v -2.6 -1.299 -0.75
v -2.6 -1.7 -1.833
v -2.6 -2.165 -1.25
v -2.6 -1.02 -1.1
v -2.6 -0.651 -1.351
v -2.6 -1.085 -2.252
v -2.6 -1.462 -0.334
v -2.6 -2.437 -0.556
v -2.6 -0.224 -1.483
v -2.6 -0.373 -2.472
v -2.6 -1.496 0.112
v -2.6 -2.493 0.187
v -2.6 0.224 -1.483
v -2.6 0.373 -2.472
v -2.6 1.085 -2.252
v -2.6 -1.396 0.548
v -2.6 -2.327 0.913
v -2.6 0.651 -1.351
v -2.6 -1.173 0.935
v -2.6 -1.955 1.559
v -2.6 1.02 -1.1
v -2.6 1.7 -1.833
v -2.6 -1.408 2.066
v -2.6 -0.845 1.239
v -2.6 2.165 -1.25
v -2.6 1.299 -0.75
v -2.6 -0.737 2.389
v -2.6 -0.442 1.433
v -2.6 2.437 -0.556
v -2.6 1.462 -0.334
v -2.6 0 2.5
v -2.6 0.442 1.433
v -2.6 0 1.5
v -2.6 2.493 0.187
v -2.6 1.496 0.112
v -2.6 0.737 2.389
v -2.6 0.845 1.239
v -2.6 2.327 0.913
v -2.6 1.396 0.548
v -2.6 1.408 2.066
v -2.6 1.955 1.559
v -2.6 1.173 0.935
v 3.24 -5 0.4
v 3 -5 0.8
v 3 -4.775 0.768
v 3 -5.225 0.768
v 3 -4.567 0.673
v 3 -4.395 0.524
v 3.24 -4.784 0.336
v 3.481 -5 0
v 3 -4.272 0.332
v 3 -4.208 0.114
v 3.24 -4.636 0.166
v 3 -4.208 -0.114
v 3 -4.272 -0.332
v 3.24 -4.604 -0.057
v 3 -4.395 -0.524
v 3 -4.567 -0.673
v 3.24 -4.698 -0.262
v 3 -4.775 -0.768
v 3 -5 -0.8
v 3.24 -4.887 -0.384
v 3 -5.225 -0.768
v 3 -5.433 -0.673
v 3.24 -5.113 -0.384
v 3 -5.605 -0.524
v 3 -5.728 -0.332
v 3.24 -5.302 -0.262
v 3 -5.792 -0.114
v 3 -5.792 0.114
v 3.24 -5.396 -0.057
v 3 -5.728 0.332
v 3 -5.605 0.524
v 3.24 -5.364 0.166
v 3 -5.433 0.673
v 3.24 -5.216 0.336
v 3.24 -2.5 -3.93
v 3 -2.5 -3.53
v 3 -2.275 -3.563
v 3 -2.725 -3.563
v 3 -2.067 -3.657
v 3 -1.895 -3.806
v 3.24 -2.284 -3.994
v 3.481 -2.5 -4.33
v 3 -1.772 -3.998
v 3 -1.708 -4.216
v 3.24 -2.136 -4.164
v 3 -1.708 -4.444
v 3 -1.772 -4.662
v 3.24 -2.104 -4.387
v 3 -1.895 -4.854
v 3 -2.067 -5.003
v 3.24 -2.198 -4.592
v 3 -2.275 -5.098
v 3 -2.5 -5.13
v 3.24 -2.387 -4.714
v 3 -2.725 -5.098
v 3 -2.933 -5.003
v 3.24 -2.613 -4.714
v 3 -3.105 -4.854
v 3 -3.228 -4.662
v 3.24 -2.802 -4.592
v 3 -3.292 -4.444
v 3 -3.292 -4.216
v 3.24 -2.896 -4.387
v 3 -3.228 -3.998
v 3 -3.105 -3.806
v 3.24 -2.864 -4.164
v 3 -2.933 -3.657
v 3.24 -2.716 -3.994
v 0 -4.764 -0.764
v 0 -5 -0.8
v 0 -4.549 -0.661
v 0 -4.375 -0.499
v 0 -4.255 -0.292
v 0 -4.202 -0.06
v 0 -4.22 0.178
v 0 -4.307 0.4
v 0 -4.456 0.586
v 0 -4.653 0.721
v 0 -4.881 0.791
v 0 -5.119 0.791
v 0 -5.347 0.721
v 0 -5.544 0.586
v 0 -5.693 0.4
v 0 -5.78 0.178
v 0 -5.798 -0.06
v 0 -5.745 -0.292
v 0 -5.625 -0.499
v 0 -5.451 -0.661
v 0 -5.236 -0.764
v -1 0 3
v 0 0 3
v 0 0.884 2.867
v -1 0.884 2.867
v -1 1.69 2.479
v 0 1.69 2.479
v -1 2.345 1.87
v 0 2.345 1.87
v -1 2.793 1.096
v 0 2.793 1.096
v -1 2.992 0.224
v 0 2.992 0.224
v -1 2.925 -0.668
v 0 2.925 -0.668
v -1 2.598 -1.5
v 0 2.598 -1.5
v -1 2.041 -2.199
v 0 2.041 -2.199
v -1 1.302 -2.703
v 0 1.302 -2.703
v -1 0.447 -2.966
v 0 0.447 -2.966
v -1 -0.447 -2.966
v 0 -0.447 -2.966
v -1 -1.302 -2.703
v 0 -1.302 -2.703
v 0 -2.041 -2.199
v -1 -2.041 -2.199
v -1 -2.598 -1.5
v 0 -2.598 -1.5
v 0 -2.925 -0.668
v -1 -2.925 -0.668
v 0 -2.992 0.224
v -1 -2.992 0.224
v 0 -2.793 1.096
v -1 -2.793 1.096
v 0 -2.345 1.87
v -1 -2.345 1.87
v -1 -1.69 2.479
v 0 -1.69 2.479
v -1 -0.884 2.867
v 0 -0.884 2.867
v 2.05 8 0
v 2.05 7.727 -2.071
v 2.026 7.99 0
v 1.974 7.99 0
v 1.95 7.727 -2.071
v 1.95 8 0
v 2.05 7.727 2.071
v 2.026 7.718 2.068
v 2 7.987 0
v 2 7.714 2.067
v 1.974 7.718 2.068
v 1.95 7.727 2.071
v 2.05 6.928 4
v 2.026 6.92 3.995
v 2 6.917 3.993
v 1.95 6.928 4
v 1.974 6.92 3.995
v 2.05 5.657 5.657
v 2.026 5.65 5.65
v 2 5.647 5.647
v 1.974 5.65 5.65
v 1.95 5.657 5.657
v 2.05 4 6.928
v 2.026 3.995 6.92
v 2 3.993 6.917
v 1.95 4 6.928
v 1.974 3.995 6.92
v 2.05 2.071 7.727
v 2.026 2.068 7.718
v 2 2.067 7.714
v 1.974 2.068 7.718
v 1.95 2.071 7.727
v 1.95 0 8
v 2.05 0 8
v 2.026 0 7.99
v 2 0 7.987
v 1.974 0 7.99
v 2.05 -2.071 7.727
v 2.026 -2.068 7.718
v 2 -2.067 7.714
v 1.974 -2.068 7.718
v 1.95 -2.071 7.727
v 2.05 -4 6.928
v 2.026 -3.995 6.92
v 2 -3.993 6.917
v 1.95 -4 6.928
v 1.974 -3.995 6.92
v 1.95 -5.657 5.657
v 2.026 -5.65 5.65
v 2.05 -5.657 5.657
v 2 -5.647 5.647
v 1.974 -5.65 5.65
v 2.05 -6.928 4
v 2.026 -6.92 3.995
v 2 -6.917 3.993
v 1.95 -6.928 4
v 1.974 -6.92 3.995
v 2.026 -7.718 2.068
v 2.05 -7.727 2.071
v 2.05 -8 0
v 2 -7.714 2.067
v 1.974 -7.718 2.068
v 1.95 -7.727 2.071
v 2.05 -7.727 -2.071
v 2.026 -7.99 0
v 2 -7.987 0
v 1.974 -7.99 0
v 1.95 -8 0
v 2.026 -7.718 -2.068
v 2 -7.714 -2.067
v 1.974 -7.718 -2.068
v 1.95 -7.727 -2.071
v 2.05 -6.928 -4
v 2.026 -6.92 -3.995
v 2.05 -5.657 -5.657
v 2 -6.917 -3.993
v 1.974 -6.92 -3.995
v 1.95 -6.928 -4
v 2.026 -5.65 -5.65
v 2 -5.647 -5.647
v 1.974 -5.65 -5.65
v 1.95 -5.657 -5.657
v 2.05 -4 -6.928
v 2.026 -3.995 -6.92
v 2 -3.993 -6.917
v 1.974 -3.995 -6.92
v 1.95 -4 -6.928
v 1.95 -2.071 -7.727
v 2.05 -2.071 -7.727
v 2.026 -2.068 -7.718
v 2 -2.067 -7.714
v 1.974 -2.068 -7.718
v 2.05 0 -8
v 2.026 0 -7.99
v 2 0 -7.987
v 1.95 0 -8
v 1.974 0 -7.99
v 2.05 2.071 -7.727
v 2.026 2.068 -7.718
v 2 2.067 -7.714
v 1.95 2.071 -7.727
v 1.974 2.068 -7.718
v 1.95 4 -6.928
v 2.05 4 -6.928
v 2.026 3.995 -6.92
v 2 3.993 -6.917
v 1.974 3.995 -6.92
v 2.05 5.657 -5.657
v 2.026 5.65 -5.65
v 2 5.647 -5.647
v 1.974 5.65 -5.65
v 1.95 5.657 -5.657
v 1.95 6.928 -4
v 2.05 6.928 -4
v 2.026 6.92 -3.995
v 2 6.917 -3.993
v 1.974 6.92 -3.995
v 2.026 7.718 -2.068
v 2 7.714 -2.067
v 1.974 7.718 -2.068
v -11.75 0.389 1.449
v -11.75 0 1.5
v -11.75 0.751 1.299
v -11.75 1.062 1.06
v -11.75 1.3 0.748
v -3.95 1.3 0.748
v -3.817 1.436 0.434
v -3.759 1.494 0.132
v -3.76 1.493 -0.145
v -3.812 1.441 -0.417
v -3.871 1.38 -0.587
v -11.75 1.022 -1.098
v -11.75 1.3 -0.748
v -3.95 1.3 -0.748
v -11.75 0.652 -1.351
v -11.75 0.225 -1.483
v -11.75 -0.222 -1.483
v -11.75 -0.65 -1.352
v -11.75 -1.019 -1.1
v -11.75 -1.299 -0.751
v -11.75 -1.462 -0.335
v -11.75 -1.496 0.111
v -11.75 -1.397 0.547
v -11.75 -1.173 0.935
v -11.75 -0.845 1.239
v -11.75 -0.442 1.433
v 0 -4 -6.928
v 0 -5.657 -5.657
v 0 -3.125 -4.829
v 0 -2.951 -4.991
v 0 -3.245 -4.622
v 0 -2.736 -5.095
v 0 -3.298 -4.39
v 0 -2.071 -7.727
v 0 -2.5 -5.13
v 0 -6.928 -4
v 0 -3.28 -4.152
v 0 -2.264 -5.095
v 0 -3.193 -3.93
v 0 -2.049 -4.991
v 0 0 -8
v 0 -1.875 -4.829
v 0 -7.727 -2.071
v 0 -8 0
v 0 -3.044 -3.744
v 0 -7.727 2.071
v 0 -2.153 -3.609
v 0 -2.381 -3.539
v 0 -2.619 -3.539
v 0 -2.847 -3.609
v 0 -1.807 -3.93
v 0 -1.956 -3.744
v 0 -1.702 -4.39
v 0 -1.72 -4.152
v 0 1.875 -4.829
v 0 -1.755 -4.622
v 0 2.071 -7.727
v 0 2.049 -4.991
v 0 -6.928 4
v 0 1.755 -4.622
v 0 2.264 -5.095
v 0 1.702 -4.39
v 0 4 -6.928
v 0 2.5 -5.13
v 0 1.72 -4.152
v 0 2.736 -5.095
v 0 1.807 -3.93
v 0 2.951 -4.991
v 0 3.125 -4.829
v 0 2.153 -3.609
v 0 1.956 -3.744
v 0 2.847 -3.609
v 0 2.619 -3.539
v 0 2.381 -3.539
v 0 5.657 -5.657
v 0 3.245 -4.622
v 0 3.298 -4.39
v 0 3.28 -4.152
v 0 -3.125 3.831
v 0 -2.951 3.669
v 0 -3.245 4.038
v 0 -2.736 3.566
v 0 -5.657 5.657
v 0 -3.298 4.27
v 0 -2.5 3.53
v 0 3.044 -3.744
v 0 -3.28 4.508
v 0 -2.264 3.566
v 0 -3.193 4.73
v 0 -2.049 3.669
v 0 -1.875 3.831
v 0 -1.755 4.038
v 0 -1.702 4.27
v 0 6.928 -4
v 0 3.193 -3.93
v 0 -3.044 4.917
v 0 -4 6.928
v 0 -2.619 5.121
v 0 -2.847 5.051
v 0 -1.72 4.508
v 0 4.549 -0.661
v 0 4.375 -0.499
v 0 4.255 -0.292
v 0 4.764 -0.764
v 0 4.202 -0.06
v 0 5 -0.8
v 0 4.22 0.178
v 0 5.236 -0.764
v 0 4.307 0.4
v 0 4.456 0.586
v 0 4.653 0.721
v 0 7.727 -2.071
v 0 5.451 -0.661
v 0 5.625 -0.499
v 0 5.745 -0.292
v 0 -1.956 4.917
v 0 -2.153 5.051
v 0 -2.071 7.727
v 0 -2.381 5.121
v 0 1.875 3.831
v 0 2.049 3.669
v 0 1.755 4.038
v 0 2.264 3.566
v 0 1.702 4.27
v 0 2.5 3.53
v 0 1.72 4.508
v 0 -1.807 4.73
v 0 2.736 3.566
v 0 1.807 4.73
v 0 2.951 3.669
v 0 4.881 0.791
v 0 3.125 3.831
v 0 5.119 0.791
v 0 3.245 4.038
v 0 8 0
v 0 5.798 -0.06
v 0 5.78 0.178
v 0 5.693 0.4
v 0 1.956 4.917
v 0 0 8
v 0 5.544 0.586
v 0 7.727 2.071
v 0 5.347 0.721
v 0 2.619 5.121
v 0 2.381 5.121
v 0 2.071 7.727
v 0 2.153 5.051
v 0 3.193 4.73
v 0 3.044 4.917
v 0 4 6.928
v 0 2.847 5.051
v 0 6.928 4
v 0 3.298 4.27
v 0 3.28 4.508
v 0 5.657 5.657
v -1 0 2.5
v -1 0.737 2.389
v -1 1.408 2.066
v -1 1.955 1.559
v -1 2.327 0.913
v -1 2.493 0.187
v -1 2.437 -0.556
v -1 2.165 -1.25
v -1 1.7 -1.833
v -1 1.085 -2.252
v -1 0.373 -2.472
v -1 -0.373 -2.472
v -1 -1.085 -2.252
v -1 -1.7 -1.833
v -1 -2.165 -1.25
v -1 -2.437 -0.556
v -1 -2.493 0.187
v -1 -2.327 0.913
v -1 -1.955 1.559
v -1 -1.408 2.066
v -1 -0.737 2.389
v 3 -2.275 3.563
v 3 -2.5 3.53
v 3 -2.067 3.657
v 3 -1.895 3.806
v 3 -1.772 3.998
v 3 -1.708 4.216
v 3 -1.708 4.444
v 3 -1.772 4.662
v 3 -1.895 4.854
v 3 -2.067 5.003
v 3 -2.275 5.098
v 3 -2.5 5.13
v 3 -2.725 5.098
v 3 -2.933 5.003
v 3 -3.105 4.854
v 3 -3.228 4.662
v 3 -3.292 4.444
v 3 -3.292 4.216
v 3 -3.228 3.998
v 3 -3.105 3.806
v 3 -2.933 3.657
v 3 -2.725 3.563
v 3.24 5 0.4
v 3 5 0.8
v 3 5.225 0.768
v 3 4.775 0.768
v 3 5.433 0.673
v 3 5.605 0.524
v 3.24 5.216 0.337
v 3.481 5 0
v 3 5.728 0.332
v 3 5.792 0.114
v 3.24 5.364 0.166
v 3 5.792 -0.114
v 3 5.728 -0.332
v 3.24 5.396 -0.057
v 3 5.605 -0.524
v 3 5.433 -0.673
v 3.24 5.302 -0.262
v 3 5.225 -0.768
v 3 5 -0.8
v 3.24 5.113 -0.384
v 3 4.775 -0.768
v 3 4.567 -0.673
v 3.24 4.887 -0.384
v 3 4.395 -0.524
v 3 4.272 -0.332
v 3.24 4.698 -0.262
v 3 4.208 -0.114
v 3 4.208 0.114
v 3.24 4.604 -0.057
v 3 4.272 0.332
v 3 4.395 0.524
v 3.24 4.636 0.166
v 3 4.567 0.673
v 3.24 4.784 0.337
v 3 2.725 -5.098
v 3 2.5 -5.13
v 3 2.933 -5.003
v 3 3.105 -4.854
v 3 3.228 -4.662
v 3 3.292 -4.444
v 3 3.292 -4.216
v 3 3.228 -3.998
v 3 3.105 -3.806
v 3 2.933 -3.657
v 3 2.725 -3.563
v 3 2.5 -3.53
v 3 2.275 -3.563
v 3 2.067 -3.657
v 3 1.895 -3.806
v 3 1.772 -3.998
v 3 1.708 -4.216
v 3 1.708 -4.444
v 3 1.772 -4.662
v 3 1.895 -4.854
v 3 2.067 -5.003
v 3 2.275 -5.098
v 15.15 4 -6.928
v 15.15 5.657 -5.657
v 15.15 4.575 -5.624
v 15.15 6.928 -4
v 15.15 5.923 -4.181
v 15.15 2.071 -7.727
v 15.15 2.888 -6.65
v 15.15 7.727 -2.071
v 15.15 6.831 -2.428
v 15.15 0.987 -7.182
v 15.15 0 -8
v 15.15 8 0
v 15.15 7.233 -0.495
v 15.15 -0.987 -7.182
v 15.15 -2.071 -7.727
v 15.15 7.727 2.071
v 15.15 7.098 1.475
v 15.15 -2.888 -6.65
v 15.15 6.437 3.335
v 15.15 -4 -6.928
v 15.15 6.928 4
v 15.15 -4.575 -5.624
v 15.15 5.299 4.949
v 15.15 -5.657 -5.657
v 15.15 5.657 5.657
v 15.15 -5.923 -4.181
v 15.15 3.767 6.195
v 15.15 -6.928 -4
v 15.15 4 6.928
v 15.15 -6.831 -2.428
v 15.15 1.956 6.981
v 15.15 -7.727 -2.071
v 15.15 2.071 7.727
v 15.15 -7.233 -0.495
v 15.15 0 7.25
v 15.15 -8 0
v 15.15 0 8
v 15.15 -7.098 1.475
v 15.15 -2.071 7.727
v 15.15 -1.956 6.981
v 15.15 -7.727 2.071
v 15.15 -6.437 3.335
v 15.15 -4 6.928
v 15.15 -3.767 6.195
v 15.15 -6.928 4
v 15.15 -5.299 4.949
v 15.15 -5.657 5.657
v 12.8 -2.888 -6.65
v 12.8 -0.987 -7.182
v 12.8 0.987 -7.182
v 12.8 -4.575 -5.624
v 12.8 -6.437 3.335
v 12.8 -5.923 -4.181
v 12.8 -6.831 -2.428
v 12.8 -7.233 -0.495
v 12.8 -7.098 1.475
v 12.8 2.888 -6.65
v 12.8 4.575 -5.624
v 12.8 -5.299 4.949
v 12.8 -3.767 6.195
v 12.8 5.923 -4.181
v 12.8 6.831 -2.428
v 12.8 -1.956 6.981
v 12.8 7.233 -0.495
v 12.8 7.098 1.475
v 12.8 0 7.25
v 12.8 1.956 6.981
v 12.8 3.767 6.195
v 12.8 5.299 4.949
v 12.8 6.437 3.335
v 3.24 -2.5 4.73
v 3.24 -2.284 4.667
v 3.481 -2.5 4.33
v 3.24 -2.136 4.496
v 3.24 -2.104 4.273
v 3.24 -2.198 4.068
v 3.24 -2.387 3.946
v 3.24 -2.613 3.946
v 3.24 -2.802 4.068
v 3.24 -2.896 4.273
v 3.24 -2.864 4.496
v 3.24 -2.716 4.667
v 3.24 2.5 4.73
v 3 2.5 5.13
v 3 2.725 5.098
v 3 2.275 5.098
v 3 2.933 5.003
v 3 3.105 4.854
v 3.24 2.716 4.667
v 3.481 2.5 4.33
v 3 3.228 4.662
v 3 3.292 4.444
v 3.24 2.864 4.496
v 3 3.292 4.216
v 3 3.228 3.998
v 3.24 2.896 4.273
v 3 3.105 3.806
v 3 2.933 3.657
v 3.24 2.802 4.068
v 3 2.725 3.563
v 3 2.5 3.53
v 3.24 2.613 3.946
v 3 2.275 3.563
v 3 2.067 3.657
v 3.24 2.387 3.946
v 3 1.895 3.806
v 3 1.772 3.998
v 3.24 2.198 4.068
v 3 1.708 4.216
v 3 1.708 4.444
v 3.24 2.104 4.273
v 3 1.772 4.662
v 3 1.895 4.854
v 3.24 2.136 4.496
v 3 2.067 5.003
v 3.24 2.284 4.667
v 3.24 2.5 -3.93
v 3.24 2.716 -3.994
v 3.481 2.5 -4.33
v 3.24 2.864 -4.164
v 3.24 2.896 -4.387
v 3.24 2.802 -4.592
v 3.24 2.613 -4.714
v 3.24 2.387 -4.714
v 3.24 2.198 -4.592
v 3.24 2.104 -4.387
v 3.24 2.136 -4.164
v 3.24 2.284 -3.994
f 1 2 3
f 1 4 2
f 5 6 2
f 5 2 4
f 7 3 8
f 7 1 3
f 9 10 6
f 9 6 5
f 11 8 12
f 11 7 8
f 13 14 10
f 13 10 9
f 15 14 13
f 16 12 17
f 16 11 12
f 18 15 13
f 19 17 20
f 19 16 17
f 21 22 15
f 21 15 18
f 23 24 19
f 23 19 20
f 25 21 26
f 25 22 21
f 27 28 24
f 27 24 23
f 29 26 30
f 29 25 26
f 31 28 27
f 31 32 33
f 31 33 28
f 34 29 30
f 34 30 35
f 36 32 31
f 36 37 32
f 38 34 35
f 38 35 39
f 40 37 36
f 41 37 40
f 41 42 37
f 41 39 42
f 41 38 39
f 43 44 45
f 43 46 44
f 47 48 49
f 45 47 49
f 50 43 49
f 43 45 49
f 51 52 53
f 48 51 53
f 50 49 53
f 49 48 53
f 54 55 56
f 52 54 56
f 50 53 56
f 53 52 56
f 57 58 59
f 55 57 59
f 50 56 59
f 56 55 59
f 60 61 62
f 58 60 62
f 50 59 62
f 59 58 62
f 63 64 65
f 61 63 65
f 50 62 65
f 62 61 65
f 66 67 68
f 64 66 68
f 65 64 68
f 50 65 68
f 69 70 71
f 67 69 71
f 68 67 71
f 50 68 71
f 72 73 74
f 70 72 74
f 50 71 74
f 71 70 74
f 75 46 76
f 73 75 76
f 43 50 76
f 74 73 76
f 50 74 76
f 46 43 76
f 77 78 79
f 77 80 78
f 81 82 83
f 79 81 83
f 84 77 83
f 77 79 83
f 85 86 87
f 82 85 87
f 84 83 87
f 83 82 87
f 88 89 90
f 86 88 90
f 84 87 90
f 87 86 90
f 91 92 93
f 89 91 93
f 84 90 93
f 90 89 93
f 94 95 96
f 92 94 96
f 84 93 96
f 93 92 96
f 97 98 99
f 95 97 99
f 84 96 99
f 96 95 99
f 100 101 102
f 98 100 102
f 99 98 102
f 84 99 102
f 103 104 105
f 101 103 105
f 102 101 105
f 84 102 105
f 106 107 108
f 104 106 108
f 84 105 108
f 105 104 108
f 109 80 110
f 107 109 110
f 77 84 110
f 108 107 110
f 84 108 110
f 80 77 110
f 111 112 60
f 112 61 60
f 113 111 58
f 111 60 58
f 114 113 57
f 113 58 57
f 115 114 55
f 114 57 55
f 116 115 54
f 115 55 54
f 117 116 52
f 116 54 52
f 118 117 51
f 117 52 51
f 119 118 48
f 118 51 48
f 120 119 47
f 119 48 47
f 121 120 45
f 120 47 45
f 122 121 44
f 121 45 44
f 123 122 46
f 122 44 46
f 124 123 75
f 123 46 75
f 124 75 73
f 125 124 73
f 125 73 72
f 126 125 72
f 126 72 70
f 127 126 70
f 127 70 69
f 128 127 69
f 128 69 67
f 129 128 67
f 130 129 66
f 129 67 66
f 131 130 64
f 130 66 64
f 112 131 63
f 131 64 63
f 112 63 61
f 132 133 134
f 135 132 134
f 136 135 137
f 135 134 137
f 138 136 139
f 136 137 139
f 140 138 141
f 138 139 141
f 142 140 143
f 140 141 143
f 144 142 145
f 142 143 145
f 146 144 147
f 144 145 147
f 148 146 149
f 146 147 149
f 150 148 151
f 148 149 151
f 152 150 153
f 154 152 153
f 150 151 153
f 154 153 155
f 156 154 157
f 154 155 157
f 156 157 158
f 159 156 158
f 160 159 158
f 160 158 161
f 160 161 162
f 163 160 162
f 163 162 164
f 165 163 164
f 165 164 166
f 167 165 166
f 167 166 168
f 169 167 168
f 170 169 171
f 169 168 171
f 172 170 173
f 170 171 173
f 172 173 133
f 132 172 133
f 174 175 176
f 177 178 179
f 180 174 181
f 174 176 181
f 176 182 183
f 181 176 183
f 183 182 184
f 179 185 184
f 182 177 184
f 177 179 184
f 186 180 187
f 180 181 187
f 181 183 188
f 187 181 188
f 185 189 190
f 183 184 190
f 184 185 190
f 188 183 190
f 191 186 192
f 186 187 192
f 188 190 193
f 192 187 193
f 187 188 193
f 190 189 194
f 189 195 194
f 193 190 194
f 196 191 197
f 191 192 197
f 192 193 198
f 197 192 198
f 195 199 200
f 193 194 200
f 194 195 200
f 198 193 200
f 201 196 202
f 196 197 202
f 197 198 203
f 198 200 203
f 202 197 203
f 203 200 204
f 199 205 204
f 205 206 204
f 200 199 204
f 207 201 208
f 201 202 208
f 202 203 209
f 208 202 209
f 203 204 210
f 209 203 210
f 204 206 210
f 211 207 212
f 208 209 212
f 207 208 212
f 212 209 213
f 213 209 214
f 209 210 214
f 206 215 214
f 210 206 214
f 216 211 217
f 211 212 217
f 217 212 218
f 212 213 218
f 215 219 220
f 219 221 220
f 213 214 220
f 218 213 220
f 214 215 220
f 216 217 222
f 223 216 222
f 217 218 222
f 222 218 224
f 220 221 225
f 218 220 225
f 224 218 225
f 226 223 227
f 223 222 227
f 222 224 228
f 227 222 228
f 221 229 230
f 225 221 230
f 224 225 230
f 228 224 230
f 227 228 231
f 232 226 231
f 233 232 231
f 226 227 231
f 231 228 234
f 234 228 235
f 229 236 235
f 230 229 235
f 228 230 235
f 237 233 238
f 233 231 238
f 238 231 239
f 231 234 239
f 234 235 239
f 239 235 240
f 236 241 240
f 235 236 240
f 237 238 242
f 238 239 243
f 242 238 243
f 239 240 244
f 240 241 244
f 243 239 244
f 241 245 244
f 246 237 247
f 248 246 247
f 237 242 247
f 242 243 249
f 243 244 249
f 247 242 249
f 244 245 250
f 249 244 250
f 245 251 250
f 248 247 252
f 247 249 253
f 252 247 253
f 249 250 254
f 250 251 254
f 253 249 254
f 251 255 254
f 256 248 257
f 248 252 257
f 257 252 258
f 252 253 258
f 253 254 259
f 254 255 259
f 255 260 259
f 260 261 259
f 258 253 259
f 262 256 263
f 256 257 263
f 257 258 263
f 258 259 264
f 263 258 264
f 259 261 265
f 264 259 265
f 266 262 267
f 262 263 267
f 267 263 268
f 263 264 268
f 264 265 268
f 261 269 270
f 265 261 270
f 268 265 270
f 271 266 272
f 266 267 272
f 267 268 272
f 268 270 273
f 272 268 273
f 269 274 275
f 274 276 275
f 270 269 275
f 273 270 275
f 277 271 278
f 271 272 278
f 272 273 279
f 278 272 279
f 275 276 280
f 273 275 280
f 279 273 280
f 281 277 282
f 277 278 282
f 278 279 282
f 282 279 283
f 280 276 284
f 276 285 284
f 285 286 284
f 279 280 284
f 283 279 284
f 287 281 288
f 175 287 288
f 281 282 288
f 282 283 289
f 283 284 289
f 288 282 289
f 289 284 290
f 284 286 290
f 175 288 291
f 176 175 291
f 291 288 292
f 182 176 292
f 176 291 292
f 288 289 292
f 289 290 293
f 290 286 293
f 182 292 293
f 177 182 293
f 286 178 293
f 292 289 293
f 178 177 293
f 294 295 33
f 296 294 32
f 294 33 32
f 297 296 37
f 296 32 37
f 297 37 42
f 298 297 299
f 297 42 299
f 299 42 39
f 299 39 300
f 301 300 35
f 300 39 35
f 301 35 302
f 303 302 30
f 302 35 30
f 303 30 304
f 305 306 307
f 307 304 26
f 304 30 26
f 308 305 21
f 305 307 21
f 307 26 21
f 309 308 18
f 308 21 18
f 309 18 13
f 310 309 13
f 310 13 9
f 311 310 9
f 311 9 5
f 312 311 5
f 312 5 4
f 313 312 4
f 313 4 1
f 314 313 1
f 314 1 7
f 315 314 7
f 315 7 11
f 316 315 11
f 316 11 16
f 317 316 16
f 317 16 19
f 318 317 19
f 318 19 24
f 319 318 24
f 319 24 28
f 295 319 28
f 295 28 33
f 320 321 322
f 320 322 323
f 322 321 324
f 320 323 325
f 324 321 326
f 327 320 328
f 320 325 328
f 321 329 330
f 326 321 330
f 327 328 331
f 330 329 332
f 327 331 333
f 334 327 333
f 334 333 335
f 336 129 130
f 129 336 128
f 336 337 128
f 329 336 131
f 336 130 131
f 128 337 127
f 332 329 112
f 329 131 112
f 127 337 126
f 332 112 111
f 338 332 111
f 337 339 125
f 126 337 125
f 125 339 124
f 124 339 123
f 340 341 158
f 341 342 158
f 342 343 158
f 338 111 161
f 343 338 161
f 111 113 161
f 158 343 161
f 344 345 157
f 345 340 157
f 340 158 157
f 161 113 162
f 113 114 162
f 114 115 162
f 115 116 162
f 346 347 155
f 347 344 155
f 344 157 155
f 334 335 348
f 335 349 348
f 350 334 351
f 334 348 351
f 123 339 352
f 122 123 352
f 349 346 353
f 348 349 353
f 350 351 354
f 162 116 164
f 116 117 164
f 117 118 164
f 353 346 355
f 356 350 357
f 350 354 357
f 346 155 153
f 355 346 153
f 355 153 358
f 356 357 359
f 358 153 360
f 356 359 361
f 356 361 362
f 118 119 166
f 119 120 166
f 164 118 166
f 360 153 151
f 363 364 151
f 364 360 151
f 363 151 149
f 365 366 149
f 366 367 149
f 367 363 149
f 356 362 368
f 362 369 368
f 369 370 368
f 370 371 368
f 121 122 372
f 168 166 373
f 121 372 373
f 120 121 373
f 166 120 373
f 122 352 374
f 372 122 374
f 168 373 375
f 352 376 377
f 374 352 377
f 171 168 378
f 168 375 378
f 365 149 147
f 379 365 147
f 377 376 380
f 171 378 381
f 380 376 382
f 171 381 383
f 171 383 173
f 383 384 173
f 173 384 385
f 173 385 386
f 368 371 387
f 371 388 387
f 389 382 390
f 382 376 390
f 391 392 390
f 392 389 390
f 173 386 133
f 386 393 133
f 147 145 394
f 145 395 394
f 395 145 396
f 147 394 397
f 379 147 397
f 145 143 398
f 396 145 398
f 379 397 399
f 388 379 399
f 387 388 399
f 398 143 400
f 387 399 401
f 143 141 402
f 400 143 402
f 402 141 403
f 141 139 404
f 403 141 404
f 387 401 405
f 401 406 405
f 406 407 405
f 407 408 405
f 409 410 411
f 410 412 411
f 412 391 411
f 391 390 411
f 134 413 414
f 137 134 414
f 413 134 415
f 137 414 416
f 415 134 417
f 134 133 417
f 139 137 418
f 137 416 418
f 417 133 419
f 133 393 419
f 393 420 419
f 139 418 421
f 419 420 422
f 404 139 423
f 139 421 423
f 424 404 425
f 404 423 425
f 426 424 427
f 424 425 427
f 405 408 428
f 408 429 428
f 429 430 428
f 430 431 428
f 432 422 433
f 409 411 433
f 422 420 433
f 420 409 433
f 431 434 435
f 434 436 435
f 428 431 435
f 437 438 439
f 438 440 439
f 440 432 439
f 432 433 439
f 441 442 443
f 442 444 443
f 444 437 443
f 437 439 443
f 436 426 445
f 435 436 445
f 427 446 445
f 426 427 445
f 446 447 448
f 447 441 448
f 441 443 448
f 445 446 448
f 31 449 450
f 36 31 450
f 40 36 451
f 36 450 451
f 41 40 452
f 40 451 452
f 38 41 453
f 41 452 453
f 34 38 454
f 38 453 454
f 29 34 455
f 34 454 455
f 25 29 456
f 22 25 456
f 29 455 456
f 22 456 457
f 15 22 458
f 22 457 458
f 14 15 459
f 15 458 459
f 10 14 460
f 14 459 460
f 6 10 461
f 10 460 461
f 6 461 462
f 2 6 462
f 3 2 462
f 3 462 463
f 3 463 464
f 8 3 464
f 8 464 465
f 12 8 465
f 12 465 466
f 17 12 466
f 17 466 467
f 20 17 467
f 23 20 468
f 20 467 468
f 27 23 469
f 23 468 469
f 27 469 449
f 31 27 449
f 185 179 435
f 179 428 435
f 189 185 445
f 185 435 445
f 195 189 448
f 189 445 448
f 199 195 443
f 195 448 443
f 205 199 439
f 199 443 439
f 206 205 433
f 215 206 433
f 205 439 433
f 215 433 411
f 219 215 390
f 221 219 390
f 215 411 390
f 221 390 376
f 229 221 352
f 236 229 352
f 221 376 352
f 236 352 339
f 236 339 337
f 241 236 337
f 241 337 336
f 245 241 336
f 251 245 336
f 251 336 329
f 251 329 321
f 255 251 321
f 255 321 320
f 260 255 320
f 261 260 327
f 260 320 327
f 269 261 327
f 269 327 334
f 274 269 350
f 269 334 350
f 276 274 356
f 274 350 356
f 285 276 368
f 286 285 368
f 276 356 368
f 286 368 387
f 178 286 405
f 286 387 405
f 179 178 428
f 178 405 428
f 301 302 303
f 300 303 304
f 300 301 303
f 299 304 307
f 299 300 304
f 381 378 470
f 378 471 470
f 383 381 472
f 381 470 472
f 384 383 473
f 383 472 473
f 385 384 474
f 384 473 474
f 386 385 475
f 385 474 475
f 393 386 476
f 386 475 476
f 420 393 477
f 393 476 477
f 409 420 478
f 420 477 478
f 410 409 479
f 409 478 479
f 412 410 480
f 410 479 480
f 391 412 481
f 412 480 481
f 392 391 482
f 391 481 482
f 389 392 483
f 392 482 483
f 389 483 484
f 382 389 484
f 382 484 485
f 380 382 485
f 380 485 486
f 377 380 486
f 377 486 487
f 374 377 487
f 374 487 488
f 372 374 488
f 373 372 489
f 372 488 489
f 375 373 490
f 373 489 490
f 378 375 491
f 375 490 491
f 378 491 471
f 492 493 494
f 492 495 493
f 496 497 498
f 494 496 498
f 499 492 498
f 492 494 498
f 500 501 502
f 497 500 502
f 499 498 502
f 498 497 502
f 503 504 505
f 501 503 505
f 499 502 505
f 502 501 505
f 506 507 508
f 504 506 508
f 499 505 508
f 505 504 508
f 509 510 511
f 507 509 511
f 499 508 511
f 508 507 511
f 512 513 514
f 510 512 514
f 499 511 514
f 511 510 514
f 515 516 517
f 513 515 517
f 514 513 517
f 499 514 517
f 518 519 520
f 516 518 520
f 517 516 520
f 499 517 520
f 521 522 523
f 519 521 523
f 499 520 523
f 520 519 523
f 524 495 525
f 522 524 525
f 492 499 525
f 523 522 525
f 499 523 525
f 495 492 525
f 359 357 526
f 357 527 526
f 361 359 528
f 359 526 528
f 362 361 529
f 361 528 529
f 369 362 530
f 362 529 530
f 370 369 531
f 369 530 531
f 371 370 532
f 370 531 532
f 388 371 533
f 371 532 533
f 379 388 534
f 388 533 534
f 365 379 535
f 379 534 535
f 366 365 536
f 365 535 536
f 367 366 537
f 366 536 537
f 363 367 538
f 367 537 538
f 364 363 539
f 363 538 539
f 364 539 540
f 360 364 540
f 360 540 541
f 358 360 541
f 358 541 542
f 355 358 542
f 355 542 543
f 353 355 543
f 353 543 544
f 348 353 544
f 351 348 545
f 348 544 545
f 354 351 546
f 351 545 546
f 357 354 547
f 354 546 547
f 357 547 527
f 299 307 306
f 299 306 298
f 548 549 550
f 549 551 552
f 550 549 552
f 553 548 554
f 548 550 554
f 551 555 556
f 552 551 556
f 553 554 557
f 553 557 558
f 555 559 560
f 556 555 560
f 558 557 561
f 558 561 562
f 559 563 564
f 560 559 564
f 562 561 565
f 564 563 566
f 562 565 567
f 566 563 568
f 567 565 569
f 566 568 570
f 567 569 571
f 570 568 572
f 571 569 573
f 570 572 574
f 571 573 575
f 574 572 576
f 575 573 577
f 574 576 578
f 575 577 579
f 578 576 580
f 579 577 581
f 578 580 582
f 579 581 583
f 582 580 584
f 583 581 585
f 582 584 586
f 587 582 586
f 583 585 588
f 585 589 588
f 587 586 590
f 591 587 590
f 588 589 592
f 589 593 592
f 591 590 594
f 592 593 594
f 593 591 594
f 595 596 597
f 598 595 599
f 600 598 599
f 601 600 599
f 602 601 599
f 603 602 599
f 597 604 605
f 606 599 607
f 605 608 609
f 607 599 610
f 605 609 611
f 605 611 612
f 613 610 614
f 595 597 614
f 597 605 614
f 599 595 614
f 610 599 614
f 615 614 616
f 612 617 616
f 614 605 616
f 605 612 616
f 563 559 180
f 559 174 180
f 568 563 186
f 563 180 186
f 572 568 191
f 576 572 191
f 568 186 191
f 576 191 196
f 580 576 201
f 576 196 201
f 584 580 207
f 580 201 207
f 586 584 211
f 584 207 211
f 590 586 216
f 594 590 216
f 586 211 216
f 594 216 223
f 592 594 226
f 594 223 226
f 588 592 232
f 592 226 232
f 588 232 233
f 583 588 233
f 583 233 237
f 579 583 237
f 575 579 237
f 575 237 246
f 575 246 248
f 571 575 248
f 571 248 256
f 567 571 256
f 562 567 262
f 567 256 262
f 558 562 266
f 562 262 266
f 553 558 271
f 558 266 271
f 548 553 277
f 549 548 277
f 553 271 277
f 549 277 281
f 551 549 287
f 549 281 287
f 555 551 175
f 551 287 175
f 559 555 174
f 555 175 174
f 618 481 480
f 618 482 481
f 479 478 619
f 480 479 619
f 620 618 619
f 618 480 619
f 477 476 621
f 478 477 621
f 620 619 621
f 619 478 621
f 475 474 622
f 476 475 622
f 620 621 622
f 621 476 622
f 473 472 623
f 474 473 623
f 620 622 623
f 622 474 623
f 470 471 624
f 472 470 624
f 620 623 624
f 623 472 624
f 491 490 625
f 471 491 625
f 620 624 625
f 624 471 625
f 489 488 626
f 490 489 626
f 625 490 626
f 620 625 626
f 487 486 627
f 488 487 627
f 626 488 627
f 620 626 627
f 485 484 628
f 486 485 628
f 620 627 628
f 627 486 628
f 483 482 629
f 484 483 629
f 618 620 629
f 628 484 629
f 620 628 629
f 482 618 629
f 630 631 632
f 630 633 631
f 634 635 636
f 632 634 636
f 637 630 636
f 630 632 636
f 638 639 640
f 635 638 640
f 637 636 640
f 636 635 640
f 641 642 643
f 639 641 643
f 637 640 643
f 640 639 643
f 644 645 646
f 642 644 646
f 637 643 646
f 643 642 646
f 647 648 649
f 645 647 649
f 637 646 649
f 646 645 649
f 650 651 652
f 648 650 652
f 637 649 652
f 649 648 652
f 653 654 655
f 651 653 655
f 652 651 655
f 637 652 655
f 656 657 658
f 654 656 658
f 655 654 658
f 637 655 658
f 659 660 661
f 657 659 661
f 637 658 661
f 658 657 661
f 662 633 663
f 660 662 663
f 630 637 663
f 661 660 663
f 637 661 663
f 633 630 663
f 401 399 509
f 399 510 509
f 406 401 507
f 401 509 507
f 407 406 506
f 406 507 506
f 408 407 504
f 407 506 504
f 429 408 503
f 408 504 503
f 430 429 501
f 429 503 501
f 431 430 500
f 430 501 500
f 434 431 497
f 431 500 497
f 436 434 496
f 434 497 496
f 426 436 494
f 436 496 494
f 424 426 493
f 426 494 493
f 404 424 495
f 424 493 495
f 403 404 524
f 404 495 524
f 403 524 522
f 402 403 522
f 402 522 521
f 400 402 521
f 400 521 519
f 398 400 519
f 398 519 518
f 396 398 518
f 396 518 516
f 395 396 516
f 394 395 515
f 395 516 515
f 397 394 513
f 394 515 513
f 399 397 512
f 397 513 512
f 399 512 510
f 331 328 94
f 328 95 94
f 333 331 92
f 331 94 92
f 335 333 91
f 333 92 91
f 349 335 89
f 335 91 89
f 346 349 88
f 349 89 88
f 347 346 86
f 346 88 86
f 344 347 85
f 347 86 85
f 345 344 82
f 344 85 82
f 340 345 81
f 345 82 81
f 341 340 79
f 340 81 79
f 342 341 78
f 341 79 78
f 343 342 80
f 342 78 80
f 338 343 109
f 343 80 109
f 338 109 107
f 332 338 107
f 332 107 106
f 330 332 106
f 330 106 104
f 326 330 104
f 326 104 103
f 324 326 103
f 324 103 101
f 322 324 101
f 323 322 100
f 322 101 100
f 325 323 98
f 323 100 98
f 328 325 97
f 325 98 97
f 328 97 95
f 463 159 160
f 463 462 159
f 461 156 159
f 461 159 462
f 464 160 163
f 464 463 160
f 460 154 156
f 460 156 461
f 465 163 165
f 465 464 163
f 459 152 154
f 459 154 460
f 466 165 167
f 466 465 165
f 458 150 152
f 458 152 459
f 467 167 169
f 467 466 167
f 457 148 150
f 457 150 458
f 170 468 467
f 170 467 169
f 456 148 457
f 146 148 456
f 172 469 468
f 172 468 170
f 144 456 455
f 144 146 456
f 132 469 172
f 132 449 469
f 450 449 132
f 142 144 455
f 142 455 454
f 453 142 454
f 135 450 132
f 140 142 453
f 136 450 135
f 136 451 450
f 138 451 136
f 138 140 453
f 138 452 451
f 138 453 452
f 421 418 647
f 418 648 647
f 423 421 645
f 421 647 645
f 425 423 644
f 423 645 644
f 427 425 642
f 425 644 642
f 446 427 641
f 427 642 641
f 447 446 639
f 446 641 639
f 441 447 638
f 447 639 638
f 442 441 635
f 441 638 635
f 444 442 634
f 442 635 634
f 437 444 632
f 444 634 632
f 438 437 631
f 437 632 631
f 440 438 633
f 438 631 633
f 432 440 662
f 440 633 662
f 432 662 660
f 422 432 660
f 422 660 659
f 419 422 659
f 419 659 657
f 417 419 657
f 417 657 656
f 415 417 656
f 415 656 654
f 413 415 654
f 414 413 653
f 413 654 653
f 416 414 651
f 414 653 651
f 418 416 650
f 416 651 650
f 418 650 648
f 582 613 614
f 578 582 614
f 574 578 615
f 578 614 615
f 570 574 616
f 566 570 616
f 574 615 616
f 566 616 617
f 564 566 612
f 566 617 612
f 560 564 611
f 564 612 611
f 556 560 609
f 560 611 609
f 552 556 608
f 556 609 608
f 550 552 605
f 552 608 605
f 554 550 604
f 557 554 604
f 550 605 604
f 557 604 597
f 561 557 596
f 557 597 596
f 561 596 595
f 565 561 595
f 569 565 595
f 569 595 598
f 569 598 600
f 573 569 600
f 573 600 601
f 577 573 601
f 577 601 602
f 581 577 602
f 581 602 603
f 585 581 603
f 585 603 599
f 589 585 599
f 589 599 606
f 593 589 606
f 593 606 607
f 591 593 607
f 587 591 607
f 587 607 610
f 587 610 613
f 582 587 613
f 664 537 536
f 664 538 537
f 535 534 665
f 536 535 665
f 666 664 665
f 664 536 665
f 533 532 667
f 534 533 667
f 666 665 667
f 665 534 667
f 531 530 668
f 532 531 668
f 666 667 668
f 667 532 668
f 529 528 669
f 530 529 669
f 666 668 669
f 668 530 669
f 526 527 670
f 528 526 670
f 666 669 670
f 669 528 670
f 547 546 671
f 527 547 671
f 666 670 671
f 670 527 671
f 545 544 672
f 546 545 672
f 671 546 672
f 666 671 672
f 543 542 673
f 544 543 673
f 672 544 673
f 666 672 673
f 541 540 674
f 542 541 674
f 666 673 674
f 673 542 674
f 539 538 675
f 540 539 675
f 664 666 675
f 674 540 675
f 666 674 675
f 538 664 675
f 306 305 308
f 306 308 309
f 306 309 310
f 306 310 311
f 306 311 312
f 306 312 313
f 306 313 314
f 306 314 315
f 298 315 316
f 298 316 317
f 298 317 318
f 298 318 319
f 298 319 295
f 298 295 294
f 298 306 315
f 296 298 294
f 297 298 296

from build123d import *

# Parameters (mm, degrees)
SKETCH2_R                        = 3
BOSS_EXTRUDE1_DEPTH              = 1
SKETCH3_R                        = 2.5
BOSS_EXTRUDE2_DEPTH              = 1.6
SKETCH4_R                        = 1.5
BOSS_EXTRUDE3_DEPTH              = 9.15
CUT_EXTRUDE1_DEPTH               = 7.8
DRAFT1_ANGLE                     = 44.5
F_14_5_14_5_DIAMETER_HOLE1_D     = 14.5
F_14_5_14_5_DIAMETER_HOLE1_DEPTH = 2.35
F_1_6_1_6_DIAMETER_HOLE1_D       = 1.6
F_1_6_1_6_DIAMETER_HOLE1_DEPTH   = 3
F_1_6_1_6_DIAMETER_HOLE1_TIP     = 0.480688495


with BuildPart() as part:
    # Sketch1 → Revolve1 (revolve)
    with BuildSketch(Plane.XY):
        with BuildLine():
            Line((0, 8), (0, 0))
            Line((0, 0), (15.15, 0))
            Line((15.15, 0), (15.15, 8))
            Line((15.15, 8), (2.05, 8))
            ThreePointArc((2.05, 8), (2, 7.98660254), (1.95, 8))
            Line((1.95, 8), (0, 8))
        make_face()
    revolve(axis=Axis((0, 0, 0), (1, 0, 0)))

    # Sketch2 → Boss-Extrude1 (add)
    with BuildSketch(Plane.ZY):
        Circle(SKETCH2_R)
    extrude(amount=BOSS_EXTRUDE1_DEPTH)

    # Sketch3 → Boss-Extrude2 (add)
    with BuildSketch(Plane.ZY.offset(1)):
        Circle(SKETCH3_R)
    extrude(amount=BOSS_EXTRUDE2_DEPTH)

    # Sketch4 → Boss-Extrude3 (add)
    with BuildSketch(Plane.ZY.offset(2.6)):
        Circle(SKETCH4_R)
    extrude(amount=BOSS_EXTRUDE3_DEPTH)

    # Sketch5 → Cut-Extrude1 (cut)
    with BuildSketch(Plane.ZY.offset(11.75)):
        with BuildLine():
            Line((-0.748331477, 1.3), (0.748331477, 1.3))
            ThreePointArc((0.748331477, 1.3), (0, 1.5), (-0.748331477, 1.3))
        make_face()
    extrude(amount=-CUT_EXTRUDE1_DEPTH, mode=Mode.SUBTRACT)

    # Draft1
    draft1_faces = [part.faces().sort_by_distance(p)[0] for p in [
        (-3.95, 1.380475515, 0),
    ]]
    draft(draft1_faces, Plane(origin=(-3.95, 1.3, -0.748331477), x_dir=(0, 0, 1), z_dir=(0, 1, 0)), DRAFT1_ANGLE)

    # Ø14.5 (14.5) Diameter Hole1
    with Locations(Plane(origin=(15.15, 0, 0), x_dir=(0, 0, -1), z_dir=(1, 0, 0))):
        with Locations((0, 0)):
            Hole(F_14_5_14_5_DIAMETER_HOLE1_D / 2, depth=F_14_5_14_5_DIAMETER_HOLE1_DEPTH)

    # Ø1.6 (1.6) Diameter Hole1
    with Locations(Plane.ZY):
        with Locations((8.727e-06, 5), (4.330131382, 2.499992442), (4.330122656, -2.500007557), (-8.727e-06, -5), (-4.330131382, -2.499992442), (-4.330122656, 2.500007557)):
            Hole(F_1_6_1_6_DIAMETER_HOLE1_D / 2, depth=F_1_6_1_6_DIAMETER_HOLE1_DEPTH)
            with Locations((0, 0, -(F_1_6_1_6_DIAMETER_HOLE1_DEPTH + F_1_6_1_6_DIAMETER_HOLE1_TIP / 2))):  # 118° drill point
                Cone(0, F_1_6_1_6_DIAMETER_HOLE1_D / 2, F_1_6_1_6_DIAMETER_HOLE1_TIP, mode=Mode.SUBTRACT)


solid = part.part
